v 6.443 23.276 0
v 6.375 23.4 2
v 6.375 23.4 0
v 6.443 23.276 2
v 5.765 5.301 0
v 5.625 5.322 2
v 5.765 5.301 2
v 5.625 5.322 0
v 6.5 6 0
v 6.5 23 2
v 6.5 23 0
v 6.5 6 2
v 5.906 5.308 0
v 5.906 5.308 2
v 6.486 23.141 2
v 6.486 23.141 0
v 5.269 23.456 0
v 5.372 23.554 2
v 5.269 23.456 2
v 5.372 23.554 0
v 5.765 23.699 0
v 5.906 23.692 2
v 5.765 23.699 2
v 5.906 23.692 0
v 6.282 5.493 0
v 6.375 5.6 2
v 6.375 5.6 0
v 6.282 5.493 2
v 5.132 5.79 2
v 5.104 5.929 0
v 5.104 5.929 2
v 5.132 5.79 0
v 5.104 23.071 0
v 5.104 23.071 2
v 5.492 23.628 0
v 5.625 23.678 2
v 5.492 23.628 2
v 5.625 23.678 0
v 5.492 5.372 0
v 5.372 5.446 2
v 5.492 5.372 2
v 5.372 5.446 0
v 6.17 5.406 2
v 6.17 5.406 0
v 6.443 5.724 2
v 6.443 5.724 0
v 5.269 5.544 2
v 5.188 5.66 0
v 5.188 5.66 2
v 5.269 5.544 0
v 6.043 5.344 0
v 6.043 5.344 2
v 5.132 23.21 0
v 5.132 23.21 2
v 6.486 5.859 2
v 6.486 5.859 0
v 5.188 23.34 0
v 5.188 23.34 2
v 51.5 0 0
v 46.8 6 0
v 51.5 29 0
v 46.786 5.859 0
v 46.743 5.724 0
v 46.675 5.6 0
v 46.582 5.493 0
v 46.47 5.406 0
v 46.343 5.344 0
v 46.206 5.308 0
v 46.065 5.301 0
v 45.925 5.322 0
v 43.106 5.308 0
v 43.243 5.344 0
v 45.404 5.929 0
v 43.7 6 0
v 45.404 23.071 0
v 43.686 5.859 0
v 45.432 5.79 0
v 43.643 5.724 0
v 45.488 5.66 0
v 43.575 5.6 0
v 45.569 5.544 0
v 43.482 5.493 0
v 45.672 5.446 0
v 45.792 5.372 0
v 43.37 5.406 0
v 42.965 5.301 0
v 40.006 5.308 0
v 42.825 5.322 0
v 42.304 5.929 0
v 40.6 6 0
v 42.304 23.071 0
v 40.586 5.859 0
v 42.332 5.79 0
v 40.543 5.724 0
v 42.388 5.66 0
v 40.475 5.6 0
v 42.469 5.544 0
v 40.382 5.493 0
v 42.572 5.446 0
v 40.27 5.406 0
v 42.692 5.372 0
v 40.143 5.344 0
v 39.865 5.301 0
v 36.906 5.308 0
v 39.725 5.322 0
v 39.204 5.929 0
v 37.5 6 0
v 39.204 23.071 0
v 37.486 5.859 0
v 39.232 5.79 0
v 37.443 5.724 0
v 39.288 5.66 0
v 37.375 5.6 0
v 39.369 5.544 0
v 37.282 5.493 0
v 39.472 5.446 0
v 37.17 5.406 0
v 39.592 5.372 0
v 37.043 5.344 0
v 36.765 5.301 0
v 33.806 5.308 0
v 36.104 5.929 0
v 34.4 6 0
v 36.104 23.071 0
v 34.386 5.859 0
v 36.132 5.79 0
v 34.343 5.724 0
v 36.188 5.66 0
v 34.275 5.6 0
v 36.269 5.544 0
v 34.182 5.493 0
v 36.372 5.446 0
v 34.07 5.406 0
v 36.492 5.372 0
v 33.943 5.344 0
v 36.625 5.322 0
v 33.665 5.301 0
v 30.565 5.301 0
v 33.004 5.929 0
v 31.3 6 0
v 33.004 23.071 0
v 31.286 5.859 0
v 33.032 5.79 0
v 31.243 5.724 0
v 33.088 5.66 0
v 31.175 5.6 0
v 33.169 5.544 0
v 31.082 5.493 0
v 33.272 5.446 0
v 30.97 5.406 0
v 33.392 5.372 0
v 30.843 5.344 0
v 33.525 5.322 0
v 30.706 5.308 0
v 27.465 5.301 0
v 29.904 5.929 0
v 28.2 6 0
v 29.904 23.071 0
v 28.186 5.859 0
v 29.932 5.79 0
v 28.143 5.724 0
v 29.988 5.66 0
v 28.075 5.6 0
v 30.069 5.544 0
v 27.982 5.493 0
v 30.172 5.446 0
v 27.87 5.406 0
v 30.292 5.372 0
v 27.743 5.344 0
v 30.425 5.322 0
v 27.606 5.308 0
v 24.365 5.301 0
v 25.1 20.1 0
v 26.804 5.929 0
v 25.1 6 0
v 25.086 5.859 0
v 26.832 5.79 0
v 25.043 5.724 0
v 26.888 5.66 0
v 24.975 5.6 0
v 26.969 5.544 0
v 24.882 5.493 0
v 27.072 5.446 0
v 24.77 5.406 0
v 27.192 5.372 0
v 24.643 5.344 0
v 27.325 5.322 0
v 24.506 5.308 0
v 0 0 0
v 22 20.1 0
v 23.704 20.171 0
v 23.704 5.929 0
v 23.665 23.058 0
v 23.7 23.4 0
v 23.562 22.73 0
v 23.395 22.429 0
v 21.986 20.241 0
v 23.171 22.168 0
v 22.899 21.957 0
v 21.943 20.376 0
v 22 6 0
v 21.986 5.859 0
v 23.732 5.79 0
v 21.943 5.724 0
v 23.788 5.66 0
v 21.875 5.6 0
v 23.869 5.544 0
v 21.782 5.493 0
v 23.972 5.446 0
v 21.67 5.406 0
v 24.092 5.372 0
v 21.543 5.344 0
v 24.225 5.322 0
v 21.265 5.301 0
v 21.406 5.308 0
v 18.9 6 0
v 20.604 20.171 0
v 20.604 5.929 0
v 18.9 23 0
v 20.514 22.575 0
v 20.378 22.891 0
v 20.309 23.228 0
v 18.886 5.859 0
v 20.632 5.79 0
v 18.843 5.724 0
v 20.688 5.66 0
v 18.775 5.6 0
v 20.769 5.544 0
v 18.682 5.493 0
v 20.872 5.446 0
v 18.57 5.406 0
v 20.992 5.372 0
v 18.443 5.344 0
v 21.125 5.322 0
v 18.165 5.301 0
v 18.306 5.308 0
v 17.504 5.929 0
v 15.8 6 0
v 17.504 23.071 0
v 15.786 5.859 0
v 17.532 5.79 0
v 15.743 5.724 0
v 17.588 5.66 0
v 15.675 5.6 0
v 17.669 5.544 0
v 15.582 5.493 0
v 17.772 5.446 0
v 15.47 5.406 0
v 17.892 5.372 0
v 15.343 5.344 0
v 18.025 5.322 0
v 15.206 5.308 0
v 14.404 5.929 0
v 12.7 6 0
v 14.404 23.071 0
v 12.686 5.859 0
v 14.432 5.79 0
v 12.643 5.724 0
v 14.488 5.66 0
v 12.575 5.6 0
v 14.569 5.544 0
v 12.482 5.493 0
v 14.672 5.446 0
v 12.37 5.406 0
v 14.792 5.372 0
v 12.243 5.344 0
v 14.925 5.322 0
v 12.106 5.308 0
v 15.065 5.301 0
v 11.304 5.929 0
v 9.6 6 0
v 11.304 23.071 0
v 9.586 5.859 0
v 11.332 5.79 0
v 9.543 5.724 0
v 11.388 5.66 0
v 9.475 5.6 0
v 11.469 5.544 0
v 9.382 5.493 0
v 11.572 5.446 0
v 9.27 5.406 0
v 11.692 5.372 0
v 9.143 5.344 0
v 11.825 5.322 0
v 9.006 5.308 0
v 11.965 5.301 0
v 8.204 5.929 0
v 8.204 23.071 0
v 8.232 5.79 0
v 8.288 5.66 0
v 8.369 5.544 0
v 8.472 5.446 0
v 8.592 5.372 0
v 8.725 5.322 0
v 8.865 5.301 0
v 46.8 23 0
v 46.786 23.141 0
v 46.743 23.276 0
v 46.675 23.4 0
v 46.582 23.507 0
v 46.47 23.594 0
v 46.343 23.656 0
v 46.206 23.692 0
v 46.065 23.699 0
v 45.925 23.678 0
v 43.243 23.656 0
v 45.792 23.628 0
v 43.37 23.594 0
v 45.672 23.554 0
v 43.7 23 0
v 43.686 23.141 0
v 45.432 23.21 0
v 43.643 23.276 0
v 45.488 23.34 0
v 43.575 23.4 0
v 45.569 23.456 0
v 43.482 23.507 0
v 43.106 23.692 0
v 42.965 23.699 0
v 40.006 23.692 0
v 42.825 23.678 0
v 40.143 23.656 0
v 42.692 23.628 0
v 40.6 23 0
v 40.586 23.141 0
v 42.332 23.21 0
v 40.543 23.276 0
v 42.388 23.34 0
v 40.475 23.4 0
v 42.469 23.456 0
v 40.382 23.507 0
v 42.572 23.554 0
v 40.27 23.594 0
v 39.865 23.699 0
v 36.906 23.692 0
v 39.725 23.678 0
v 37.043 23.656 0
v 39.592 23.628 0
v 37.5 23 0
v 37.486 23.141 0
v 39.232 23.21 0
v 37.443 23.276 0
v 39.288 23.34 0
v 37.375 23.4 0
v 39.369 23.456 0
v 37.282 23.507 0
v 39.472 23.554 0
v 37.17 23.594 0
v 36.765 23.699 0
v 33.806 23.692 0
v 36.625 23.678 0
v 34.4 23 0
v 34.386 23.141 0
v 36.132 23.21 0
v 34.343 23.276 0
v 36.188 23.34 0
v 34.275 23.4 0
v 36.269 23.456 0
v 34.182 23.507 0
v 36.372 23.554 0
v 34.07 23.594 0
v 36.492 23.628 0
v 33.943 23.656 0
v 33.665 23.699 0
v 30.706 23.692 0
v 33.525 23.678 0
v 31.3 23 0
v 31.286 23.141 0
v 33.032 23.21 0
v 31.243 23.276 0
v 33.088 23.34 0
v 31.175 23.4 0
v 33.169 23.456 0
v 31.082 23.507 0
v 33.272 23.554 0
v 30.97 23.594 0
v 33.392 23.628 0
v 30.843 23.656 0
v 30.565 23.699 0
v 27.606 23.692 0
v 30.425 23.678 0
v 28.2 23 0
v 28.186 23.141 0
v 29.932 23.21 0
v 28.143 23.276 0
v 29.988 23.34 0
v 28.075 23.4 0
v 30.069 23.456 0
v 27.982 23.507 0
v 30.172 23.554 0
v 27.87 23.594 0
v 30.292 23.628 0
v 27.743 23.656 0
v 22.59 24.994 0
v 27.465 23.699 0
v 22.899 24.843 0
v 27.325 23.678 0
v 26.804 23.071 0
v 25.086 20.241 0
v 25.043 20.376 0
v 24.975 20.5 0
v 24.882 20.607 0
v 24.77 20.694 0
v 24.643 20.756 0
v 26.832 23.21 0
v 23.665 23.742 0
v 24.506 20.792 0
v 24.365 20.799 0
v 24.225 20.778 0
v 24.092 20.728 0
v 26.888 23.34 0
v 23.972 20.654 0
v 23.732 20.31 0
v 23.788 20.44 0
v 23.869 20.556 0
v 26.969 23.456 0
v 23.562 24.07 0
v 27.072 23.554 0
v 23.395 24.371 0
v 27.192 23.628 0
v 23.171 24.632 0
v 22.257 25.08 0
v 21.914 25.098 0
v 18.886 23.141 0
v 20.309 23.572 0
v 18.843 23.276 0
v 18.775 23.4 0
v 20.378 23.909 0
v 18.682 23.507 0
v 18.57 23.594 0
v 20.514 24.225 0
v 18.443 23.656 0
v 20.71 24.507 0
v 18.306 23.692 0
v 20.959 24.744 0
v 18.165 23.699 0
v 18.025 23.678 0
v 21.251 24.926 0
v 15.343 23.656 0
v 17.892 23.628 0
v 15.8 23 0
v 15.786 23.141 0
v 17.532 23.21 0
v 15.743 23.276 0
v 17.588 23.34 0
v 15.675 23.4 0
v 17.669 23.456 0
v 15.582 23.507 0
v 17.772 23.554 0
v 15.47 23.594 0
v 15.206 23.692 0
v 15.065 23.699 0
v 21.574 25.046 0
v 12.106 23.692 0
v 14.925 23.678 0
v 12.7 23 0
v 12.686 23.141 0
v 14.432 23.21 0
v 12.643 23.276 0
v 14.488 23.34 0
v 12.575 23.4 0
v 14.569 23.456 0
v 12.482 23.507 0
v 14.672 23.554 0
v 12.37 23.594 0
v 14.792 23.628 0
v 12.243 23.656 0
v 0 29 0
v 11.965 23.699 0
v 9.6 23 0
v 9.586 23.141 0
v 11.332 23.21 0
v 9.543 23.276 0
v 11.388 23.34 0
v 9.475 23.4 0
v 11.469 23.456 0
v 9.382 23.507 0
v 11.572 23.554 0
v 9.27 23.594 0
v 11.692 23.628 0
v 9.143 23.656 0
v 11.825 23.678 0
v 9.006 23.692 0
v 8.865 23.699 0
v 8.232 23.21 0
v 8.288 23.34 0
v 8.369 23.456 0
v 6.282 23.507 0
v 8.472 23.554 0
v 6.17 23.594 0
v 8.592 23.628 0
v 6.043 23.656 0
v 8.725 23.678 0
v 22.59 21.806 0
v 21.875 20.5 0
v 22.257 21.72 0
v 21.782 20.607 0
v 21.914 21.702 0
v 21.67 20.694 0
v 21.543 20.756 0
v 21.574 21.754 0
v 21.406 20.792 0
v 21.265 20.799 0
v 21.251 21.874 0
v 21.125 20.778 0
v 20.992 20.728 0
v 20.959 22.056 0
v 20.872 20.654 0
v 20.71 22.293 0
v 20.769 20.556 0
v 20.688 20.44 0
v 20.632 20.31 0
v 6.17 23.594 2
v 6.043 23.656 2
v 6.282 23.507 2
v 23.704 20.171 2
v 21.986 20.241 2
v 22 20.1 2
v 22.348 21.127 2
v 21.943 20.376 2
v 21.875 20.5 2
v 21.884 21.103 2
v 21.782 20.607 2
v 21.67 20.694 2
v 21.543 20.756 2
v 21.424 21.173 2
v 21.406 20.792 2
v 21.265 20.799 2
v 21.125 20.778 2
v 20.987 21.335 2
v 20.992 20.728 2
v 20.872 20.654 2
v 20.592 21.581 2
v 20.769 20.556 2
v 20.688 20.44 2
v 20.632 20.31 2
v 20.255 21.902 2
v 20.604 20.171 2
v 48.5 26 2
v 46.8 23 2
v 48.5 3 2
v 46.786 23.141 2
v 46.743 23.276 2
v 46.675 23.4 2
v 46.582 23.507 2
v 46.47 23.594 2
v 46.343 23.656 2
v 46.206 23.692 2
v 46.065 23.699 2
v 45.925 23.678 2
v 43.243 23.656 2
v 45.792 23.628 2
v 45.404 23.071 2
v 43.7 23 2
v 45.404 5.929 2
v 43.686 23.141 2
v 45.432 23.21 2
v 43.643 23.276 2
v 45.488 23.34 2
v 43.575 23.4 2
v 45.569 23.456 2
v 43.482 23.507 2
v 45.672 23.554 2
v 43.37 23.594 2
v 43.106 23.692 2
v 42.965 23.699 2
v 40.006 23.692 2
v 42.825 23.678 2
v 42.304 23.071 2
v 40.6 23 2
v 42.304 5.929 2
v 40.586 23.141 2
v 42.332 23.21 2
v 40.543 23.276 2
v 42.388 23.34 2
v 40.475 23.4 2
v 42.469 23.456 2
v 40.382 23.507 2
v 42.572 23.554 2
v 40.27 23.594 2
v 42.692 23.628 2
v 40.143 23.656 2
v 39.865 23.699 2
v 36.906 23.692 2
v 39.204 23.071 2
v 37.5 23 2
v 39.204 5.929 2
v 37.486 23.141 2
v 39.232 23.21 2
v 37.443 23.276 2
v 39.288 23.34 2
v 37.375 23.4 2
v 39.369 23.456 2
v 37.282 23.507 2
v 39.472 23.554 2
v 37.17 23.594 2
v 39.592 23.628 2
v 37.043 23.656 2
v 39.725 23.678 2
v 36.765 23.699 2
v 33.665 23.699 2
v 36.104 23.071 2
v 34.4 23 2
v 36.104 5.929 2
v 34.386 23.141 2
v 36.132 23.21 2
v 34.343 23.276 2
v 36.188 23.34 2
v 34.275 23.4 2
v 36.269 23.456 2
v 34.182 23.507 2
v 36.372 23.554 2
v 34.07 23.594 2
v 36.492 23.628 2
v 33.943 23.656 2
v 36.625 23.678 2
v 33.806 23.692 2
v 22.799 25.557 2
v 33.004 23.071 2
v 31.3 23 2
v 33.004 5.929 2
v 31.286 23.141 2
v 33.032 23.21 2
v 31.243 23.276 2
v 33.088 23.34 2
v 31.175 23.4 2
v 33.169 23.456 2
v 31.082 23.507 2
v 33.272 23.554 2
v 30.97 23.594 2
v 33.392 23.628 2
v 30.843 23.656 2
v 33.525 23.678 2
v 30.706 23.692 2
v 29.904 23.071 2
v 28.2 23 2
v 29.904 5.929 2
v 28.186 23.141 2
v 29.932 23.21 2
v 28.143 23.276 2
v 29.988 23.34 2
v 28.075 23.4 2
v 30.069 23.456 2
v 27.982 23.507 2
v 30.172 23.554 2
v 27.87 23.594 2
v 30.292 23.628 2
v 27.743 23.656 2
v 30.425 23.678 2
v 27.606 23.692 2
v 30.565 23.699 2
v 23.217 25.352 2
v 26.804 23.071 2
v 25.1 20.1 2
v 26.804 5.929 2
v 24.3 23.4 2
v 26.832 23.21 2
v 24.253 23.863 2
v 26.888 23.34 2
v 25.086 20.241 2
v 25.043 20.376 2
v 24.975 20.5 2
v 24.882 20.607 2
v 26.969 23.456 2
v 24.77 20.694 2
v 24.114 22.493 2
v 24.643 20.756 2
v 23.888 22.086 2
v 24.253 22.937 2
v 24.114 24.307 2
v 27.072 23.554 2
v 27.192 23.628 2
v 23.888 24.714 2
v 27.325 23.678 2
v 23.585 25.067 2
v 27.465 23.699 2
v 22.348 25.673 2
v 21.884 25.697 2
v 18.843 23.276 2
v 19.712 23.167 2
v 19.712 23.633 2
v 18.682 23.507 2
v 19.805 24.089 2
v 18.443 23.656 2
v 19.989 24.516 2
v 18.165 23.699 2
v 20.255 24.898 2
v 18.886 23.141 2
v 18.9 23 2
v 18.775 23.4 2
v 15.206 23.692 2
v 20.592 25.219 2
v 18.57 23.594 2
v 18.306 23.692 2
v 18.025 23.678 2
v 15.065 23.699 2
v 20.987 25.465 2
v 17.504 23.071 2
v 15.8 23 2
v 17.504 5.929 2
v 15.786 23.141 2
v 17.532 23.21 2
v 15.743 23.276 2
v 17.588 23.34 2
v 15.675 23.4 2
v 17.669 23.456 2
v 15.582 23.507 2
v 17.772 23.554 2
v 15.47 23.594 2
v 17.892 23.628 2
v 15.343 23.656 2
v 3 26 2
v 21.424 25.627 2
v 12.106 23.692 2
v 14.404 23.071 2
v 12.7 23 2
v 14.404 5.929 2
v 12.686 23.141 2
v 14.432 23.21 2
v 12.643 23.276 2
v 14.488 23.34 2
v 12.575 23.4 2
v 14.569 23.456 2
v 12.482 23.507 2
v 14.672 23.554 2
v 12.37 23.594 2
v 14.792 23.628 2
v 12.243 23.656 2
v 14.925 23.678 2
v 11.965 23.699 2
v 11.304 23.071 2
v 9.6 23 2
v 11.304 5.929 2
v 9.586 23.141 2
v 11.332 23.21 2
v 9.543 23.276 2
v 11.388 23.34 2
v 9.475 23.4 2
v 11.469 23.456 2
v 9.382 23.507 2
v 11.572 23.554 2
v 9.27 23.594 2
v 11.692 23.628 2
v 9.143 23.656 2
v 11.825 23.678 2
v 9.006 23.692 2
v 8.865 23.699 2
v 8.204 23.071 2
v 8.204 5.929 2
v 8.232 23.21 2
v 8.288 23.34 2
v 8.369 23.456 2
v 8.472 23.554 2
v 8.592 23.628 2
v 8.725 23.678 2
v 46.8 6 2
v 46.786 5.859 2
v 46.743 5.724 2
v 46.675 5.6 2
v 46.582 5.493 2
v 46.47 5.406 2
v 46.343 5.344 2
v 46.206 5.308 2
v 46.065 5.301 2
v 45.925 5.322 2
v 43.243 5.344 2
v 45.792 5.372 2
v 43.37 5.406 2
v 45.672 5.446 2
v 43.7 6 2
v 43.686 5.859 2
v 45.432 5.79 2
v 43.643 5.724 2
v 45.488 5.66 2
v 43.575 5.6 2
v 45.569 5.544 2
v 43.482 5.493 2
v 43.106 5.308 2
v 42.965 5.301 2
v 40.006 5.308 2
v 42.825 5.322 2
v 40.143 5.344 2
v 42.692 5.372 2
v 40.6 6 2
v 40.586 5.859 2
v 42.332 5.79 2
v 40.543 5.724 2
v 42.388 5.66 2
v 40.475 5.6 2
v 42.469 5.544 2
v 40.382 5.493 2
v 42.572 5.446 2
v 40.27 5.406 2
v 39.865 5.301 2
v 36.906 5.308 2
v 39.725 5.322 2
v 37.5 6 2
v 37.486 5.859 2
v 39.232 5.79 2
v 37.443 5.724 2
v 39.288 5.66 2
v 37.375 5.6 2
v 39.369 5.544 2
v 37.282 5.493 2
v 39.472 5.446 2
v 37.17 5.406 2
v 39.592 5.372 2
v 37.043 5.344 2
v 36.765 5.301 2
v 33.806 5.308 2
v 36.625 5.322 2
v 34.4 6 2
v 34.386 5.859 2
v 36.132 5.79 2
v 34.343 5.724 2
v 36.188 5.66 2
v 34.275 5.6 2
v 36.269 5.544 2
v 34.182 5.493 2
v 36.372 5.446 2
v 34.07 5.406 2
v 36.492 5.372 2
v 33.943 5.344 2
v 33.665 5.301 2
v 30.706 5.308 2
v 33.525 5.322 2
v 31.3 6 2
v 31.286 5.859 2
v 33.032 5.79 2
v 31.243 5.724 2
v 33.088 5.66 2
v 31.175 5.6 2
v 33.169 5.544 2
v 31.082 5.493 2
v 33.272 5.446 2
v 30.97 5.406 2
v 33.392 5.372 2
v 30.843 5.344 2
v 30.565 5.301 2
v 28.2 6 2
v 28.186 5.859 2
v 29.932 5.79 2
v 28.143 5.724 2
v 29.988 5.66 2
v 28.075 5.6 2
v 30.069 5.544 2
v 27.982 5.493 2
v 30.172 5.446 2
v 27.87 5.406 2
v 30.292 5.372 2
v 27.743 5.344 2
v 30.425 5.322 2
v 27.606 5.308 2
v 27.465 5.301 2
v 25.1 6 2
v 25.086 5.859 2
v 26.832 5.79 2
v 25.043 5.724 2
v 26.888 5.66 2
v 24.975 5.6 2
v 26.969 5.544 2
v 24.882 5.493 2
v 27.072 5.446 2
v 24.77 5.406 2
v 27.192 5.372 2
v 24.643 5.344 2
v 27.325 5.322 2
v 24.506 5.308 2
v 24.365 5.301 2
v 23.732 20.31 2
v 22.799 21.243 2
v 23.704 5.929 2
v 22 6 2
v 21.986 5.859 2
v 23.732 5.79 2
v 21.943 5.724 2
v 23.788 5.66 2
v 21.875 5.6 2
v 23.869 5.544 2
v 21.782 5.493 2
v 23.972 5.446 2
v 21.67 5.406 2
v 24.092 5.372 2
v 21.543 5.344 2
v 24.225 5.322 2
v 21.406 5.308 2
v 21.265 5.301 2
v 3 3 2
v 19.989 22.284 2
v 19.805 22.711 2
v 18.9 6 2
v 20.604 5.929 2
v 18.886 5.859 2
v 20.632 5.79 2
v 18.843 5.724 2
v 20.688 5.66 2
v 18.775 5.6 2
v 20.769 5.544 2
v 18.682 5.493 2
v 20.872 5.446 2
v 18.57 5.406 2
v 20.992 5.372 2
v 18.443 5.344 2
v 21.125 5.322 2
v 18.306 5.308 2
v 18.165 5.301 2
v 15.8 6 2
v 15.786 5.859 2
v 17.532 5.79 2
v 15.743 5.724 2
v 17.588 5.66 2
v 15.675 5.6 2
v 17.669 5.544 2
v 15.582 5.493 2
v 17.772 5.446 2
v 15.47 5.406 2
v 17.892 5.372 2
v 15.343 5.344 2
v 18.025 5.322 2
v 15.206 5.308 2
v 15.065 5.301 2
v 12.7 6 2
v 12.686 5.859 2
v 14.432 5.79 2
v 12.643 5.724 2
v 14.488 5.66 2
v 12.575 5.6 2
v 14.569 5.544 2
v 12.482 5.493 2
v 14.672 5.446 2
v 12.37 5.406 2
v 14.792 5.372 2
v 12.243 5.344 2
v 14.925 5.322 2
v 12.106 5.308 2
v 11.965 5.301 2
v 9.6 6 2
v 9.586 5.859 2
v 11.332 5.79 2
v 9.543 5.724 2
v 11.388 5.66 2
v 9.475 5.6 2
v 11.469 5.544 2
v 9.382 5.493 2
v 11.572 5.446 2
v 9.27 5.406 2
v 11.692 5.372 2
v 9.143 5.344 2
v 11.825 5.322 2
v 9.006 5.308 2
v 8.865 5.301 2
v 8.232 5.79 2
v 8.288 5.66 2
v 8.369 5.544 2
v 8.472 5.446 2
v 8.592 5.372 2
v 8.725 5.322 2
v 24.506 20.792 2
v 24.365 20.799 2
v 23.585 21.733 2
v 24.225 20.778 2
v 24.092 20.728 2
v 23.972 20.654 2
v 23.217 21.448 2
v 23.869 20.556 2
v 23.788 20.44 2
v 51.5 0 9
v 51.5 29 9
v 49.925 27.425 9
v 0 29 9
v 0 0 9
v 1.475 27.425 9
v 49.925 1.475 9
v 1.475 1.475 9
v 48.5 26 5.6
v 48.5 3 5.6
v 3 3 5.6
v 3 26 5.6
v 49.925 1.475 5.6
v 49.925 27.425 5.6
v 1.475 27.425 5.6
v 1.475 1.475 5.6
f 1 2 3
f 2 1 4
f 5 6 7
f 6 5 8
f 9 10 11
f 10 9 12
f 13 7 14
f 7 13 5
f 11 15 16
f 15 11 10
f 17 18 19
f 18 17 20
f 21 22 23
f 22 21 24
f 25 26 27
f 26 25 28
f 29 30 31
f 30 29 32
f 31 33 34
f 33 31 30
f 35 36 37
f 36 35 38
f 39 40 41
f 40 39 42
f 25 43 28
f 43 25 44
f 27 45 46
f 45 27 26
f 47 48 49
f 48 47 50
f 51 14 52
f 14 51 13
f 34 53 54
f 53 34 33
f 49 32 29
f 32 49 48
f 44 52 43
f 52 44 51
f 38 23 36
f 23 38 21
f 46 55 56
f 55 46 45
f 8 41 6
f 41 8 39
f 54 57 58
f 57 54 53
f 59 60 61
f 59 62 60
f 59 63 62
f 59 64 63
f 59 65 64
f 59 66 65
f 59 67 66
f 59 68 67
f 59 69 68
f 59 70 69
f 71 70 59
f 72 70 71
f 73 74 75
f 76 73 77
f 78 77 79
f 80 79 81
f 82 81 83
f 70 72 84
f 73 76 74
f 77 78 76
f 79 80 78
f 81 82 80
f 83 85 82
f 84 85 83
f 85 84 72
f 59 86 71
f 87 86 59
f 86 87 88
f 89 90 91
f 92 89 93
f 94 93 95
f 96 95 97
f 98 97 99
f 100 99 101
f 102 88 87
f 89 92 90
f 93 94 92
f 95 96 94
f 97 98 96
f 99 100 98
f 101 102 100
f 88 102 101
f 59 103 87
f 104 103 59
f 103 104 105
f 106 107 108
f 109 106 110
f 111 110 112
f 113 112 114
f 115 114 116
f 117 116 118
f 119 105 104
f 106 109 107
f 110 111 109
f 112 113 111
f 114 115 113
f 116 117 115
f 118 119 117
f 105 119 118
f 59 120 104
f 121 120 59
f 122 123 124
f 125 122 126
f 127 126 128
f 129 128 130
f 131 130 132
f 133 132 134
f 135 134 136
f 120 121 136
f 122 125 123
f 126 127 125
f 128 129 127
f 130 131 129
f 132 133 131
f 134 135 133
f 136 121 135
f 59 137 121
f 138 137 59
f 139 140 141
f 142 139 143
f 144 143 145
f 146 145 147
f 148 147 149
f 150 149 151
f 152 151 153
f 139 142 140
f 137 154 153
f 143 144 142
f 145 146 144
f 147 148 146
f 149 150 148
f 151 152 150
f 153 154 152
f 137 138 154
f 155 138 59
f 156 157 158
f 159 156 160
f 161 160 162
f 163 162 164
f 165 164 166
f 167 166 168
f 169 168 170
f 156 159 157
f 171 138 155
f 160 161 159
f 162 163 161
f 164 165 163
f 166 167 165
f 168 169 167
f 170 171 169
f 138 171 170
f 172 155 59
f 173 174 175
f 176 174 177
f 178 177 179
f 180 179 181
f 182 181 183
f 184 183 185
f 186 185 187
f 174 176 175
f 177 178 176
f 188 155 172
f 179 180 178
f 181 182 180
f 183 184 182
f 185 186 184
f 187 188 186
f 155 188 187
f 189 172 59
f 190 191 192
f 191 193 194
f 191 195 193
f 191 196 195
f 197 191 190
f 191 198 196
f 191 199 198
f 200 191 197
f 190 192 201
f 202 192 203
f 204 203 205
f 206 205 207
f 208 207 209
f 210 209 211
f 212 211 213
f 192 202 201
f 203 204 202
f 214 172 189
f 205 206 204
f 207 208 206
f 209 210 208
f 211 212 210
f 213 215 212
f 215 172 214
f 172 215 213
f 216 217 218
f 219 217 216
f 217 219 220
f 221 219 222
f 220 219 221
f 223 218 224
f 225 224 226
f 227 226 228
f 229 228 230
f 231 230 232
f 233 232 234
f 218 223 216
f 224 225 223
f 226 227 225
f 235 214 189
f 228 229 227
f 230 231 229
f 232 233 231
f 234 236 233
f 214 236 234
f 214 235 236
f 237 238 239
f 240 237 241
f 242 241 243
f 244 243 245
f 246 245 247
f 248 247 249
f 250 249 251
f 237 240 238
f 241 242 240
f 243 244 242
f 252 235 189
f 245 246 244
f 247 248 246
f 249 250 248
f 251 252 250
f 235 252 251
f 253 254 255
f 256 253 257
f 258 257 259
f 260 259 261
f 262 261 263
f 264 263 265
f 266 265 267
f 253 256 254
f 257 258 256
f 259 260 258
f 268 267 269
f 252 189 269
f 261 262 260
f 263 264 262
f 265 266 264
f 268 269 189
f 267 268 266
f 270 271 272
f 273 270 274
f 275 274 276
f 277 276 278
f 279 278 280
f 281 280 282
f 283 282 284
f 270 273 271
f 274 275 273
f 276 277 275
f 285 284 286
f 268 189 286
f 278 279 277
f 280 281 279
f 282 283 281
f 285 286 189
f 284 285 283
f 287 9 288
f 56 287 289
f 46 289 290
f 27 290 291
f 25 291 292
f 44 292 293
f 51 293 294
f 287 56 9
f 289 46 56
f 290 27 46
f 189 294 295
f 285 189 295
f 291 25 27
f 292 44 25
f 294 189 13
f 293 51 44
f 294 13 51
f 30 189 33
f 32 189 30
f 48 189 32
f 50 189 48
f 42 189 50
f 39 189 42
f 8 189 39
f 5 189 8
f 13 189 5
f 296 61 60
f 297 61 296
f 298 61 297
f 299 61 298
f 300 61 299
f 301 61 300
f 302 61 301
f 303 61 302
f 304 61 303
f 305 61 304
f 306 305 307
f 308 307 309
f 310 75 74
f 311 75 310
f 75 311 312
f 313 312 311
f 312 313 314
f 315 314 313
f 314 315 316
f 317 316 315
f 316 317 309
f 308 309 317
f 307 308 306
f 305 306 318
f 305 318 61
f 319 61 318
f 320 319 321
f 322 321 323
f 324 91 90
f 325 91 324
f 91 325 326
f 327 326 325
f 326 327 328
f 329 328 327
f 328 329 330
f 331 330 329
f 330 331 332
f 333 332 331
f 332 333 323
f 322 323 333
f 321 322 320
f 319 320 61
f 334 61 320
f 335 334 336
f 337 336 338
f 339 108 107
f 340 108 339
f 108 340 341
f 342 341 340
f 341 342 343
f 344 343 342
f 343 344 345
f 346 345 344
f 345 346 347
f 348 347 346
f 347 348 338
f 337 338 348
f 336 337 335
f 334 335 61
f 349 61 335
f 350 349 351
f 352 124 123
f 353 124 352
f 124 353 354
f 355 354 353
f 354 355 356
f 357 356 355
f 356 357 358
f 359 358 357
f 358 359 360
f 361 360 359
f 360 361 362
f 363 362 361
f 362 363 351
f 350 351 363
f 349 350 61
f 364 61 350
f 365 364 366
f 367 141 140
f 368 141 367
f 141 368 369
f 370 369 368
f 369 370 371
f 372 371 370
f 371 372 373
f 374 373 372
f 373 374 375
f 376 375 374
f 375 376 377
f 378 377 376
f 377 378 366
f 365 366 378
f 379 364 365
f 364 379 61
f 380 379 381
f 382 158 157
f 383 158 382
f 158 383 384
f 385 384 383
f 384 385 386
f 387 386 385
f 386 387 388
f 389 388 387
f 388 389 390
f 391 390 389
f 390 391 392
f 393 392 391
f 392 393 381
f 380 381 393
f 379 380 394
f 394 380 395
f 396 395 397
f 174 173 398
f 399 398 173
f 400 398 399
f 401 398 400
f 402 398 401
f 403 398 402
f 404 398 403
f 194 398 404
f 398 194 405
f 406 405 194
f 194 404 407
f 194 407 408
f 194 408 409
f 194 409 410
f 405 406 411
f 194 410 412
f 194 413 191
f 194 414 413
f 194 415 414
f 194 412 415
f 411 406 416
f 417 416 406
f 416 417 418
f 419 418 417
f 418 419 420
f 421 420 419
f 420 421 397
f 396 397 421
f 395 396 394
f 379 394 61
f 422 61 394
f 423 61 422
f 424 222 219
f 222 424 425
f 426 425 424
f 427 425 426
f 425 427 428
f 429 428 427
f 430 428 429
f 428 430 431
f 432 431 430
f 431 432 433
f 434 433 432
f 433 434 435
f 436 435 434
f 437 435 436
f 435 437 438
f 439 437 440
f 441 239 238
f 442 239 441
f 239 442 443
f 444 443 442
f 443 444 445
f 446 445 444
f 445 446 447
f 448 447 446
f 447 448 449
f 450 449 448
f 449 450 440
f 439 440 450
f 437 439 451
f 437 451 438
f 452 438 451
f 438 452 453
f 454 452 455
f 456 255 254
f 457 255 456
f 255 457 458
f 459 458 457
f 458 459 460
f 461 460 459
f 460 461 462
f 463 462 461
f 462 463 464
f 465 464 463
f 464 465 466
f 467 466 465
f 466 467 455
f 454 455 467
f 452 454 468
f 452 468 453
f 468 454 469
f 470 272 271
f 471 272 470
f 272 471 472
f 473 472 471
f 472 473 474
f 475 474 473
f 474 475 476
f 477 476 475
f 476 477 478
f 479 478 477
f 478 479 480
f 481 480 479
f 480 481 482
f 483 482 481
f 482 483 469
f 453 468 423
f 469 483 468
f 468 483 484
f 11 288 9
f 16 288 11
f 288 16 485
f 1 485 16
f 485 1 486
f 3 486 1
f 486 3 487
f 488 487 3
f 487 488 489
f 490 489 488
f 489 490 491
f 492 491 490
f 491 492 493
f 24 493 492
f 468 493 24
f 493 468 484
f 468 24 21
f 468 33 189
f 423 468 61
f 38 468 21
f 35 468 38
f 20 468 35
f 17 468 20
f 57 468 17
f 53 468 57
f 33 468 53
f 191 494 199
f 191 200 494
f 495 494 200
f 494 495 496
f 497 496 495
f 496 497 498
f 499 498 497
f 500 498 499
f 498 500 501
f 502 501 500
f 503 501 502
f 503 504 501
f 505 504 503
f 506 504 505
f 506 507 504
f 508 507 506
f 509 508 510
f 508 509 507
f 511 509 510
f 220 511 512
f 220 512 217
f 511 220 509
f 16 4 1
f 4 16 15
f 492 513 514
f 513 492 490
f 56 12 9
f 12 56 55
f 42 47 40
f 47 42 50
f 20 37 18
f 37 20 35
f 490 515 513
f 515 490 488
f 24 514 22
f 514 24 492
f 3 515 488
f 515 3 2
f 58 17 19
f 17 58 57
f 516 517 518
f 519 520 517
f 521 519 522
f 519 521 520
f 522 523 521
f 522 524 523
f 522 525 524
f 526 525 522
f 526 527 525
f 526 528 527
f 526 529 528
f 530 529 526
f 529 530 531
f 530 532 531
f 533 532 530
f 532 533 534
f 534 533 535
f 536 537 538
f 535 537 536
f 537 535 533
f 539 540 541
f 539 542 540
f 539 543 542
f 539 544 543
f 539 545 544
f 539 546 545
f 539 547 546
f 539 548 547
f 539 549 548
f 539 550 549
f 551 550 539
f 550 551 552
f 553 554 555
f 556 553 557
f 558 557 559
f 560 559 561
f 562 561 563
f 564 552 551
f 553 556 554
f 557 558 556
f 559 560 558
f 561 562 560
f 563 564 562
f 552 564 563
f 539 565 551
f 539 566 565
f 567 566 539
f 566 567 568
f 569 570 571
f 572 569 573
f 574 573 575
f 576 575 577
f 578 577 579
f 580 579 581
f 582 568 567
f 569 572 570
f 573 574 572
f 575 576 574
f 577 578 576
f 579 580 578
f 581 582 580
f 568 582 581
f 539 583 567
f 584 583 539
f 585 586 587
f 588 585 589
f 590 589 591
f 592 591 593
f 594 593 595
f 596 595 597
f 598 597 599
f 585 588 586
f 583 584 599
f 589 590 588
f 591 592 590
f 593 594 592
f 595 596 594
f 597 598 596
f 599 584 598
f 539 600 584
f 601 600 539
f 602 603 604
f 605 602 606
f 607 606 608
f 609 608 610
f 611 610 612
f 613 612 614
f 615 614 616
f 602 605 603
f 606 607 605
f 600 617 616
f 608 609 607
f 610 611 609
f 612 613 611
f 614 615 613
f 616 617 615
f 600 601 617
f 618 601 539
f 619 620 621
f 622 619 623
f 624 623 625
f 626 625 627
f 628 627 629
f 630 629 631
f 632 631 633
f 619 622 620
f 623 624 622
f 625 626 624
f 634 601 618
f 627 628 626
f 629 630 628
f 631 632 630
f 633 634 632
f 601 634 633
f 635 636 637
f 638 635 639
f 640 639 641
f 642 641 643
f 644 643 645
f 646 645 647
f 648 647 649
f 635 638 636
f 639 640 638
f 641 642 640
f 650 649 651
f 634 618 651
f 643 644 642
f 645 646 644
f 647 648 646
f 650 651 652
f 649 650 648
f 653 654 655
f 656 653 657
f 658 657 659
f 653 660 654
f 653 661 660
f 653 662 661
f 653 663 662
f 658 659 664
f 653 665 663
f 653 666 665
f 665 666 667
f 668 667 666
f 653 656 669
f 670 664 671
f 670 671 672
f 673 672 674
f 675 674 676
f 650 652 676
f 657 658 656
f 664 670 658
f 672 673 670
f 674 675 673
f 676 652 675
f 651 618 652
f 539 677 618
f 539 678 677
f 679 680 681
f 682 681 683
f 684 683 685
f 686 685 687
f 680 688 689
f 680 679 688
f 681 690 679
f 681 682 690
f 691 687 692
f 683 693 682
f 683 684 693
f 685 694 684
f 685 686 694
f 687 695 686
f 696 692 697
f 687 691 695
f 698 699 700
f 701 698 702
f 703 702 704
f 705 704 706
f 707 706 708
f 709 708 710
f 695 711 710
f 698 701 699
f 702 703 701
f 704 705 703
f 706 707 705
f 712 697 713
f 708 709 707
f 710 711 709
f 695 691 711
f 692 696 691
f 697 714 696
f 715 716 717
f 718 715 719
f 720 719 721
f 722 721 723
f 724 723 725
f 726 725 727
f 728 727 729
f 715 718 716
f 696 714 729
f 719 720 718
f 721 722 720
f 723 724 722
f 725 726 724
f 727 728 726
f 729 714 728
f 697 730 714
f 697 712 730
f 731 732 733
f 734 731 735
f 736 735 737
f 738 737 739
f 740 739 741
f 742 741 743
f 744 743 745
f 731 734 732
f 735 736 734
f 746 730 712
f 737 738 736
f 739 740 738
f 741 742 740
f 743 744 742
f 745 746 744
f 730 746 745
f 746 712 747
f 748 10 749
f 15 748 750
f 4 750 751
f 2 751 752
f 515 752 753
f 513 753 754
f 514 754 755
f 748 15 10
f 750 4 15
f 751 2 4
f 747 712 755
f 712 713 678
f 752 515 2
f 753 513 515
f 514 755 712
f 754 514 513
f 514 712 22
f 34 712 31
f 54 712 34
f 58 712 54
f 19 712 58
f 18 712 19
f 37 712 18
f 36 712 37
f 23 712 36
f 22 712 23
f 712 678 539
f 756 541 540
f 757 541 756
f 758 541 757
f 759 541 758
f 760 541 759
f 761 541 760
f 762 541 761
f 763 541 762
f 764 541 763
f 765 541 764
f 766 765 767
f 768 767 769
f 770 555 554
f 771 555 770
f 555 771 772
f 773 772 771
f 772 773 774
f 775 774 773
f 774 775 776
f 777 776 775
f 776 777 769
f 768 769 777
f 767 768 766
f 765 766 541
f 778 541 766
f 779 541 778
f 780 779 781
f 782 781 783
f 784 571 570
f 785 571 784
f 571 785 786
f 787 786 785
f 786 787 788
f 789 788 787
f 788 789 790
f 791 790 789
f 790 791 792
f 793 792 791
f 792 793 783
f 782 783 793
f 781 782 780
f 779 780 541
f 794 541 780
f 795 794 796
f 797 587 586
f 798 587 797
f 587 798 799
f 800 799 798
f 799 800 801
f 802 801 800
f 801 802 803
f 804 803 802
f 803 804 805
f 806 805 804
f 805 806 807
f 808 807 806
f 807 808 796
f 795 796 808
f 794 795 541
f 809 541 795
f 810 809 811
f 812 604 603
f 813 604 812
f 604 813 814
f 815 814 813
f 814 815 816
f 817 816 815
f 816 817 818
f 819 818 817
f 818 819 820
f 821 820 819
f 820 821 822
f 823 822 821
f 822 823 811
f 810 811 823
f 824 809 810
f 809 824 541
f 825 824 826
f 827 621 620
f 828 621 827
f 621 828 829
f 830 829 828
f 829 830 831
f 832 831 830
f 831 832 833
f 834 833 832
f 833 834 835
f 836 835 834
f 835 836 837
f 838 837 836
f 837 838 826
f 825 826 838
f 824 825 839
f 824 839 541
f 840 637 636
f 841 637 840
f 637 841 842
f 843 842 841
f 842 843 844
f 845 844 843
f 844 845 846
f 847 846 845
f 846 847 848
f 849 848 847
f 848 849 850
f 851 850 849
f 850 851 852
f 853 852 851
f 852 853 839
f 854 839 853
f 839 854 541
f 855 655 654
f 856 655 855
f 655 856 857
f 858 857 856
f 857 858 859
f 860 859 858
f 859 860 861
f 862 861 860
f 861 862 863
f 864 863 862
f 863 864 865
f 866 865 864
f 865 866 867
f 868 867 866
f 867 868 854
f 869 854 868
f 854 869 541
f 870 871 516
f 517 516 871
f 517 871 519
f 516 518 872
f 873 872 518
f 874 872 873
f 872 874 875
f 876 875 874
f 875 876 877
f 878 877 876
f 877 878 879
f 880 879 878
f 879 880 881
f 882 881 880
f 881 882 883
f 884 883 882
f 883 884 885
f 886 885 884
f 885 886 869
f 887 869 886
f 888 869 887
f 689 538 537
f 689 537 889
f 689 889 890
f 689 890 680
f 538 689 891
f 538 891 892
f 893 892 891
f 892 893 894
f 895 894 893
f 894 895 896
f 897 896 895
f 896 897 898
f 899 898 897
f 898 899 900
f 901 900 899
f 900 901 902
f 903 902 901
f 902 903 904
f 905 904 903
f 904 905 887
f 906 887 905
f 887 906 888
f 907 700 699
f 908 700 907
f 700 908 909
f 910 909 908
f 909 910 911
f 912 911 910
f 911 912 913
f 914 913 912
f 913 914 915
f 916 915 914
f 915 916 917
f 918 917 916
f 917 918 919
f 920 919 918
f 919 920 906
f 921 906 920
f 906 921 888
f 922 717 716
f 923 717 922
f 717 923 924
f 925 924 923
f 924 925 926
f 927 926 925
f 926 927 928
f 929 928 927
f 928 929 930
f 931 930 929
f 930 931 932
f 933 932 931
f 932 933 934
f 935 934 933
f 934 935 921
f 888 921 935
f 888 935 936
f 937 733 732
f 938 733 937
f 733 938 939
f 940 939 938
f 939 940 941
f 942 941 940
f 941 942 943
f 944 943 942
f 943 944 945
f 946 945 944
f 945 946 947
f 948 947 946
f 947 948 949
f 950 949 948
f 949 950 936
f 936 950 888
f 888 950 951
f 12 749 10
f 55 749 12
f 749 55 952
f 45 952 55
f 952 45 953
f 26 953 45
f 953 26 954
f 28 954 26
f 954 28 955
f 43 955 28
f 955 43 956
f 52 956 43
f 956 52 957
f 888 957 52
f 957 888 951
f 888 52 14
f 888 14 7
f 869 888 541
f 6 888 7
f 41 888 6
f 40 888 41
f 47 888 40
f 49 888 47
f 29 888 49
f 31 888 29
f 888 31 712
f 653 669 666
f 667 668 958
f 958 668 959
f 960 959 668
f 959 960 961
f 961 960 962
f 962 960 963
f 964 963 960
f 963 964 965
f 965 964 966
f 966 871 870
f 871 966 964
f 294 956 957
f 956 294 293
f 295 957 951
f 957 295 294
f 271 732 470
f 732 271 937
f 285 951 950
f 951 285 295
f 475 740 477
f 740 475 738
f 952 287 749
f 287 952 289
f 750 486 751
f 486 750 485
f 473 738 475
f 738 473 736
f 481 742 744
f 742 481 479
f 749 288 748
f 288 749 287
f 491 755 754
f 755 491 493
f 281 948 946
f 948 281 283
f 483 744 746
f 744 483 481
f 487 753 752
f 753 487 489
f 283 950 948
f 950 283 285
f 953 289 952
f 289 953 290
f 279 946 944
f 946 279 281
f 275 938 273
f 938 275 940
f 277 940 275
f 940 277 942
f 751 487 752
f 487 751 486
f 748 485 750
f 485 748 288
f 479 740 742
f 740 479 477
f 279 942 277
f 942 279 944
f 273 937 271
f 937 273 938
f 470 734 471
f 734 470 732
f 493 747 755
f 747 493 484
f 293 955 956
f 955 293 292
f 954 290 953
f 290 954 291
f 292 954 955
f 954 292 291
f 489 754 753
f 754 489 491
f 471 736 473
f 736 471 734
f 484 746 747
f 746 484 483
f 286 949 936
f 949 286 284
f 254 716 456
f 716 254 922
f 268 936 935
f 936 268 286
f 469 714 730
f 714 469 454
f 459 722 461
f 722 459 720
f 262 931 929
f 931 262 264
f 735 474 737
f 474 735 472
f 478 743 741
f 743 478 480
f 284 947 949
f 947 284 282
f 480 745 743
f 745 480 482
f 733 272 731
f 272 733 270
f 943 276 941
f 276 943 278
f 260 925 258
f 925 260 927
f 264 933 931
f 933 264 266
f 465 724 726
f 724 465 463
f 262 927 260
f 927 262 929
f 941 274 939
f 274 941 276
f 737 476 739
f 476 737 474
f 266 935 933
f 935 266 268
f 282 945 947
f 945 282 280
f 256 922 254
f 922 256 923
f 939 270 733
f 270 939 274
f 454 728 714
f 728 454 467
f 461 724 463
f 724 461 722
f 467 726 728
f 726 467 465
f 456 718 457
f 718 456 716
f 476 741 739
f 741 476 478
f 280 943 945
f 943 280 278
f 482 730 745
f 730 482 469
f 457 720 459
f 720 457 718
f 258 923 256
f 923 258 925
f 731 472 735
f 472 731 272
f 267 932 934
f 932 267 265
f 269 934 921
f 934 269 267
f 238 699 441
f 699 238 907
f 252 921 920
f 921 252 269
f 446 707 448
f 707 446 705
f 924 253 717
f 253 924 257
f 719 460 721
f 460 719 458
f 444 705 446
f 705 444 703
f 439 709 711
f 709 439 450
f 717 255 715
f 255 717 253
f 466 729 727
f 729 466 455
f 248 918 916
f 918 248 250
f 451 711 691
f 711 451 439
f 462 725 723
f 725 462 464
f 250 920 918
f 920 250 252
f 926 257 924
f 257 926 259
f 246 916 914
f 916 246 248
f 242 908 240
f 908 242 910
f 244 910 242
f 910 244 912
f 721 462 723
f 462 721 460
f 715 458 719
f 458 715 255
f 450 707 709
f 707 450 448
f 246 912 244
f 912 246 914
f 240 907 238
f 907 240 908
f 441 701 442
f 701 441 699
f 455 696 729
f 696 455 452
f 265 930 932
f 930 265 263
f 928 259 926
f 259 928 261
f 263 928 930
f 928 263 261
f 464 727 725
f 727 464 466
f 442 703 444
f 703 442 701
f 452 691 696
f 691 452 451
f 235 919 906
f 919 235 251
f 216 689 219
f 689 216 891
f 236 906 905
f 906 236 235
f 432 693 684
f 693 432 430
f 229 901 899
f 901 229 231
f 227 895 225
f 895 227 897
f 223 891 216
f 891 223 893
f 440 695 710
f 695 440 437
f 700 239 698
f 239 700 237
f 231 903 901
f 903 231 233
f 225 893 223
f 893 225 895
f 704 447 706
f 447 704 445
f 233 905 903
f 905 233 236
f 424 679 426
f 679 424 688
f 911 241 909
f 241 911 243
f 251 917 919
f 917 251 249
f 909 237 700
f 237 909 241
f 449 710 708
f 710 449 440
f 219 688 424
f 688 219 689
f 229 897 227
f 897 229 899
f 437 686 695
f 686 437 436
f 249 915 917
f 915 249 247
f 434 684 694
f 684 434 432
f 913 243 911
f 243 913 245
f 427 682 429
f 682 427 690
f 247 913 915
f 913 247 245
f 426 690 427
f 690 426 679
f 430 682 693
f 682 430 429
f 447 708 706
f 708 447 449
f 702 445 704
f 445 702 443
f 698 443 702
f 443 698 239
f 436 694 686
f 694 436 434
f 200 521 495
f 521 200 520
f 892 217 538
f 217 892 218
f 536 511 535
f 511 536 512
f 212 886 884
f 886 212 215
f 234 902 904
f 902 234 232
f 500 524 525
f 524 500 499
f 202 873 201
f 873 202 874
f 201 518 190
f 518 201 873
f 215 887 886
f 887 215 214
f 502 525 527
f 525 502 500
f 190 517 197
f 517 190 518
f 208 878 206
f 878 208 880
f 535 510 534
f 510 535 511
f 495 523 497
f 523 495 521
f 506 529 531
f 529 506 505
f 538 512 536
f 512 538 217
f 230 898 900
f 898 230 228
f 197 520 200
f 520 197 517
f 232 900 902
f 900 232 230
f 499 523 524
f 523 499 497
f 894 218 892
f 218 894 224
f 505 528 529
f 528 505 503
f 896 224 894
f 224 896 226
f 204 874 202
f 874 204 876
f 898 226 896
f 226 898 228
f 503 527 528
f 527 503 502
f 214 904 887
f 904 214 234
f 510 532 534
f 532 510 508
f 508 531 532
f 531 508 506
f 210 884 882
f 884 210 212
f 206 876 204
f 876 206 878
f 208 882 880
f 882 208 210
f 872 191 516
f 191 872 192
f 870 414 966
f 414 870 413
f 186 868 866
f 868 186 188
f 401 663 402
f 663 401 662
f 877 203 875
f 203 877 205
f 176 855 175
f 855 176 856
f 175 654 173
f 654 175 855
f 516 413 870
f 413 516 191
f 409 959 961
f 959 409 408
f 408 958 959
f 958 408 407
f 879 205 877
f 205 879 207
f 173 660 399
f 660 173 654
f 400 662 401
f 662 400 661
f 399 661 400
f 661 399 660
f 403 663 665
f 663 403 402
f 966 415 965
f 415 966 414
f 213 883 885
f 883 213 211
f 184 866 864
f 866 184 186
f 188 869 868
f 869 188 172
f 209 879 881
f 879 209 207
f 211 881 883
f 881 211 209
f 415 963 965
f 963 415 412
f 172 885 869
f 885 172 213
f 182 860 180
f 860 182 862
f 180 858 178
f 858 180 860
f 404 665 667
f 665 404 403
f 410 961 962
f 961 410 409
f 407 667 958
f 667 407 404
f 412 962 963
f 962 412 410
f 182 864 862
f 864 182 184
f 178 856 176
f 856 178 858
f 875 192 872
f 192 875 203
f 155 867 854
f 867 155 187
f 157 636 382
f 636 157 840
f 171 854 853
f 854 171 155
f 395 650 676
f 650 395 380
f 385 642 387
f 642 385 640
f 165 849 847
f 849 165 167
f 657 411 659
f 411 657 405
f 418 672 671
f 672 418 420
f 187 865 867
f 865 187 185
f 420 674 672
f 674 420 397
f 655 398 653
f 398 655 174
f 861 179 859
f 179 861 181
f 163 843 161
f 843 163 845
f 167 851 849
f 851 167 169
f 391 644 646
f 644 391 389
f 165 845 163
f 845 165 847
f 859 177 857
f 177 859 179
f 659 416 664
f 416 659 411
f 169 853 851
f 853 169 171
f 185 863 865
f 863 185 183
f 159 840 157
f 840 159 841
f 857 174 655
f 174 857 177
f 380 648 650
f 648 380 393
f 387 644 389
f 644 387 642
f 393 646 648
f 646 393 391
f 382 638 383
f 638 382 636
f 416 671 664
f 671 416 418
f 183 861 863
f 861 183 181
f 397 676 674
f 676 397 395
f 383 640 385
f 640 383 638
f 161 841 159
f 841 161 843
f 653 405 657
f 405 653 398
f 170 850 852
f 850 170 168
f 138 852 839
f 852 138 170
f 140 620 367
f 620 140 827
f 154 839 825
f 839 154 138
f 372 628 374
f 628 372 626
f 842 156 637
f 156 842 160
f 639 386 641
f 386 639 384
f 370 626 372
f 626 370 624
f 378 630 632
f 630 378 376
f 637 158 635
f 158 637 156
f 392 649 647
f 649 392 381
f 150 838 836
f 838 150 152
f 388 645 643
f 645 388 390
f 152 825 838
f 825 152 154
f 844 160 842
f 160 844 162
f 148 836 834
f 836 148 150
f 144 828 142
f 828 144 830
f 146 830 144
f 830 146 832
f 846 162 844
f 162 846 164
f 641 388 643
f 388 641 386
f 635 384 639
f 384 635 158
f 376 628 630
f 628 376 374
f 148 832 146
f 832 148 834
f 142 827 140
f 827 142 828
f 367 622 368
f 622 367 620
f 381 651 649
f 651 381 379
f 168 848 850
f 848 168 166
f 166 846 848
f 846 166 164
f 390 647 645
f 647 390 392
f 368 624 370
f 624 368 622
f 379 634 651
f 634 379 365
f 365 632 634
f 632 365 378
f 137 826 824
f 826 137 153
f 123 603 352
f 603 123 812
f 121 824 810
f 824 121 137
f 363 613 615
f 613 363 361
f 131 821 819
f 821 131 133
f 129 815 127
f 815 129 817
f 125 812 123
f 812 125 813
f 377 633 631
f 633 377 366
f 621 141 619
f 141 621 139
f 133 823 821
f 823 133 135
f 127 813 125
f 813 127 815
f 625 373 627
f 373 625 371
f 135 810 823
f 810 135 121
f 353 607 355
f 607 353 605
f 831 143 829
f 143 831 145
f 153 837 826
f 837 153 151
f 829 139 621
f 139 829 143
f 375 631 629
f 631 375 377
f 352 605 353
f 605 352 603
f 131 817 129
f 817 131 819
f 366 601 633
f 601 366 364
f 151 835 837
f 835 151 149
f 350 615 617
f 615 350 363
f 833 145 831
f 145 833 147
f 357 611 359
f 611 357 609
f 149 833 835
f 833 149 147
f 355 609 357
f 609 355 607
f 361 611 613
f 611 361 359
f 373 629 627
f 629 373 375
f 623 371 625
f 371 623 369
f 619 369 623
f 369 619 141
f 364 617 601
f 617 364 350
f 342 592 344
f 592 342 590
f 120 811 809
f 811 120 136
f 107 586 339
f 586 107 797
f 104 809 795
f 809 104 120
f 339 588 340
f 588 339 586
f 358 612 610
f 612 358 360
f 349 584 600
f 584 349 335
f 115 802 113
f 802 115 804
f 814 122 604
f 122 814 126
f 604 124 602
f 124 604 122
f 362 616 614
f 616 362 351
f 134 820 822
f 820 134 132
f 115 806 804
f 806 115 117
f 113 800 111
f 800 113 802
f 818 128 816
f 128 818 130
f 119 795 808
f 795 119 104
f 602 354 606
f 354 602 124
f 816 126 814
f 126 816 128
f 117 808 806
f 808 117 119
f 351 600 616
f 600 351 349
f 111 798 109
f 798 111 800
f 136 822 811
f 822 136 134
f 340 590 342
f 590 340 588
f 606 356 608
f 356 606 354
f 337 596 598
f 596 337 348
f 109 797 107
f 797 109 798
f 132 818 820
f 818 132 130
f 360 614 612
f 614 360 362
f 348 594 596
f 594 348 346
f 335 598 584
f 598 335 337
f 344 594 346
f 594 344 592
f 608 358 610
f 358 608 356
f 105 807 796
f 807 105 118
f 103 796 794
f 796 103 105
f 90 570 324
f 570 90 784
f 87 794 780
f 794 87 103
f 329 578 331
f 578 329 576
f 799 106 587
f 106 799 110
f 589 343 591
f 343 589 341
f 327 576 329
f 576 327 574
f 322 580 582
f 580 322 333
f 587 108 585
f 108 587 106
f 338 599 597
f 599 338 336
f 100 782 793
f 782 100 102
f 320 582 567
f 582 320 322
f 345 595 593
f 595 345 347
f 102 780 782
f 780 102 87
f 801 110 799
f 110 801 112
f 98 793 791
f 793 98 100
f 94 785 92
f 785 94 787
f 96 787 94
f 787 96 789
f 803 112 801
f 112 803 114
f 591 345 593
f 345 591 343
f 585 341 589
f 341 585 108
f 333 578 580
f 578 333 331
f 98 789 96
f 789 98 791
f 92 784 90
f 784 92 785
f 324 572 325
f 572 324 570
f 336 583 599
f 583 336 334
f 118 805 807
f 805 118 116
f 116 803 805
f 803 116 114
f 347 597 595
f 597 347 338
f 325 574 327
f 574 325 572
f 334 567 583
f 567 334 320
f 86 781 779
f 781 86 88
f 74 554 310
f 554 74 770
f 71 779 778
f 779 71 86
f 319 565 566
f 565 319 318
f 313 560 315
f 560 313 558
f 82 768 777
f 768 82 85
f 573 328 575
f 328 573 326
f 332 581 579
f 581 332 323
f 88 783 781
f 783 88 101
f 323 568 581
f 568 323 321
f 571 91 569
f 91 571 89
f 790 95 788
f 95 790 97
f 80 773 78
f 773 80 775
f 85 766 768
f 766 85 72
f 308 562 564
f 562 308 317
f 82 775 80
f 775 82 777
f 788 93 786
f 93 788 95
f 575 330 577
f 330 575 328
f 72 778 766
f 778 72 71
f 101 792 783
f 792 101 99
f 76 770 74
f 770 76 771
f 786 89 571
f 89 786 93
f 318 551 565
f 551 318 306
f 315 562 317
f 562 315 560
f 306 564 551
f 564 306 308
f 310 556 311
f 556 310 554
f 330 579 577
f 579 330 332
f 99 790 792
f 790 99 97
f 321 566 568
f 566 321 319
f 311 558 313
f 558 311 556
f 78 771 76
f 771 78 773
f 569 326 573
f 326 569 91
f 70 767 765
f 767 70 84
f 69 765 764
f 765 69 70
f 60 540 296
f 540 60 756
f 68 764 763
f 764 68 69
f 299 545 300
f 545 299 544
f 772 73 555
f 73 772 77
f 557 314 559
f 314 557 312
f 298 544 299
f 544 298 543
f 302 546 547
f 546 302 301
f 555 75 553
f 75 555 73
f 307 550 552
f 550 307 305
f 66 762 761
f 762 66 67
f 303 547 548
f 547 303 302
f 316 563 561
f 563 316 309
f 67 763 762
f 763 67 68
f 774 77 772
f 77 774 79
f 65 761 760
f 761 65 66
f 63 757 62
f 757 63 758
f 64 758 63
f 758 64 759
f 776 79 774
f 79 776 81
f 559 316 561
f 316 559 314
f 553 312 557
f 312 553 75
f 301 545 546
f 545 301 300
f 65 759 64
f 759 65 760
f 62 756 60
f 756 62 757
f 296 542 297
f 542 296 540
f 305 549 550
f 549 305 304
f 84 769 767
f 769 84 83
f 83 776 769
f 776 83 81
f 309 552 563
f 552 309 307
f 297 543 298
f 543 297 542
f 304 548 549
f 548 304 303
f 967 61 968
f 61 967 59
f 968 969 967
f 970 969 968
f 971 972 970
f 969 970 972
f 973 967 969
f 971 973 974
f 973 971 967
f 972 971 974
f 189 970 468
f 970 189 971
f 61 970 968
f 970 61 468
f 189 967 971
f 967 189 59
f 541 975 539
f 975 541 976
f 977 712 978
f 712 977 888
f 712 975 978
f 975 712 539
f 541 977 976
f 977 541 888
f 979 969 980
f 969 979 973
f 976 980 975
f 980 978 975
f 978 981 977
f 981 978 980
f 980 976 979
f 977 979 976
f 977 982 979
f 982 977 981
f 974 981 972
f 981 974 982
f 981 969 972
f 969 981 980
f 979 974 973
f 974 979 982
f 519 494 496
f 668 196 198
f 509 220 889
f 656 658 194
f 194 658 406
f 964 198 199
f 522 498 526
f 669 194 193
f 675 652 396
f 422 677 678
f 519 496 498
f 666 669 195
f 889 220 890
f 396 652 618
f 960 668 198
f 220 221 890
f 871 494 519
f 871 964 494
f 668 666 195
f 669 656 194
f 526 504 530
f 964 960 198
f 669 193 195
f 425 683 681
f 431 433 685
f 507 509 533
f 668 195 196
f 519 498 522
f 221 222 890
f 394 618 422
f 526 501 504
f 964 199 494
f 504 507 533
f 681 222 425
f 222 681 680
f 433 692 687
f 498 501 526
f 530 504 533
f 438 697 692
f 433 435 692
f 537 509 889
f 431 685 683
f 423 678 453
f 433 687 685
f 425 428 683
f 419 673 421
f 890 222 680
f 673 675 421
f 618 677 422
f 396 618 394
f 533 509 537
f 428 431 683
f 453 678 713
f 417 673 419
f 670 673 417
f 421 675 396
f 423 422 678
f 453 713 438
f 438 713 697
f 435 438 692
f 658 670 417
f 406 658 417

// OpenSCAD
/*
 * Friction-fit Chassis for LM2596-based buck converter
 *
 * Designed and written by Roy Sigurd Karlsbakk <roy@karlsbakk.net> 2024
 * Licensed under CC BY NC 4.0 https://creativecommons.org/licenses/by/4.0/
 */

debug = true;
idiot = $preview ? .5 : 0;
fn = $preview ? 12 : 31;

board_x = 43.5;
board_y = 21;
ol_height = 3; // overlapp
b_height = 9;
t_height = 16-b_height; // bare skruen stikker ut
walls = 3;
gap = 1;
bottom = 3;
top = 2;
hole_r = 1.5;
lh_width = 4; // lead hole
lh_height = 5.5; // lead hole
tolerance_x = .05;
tolerance_z = .4;
pot_x = 9.5;
pot_y = 5.1;
pot_z = 1.5;
b_wedge = 1.15;
t_wedge = .01;
w_wedge = 2;

module bottom() {
    difference() {
        cube([board_x+walls*2+gap*2,board_y+walls*2+gap*2,b_height+bottom]);
        translate([walls,walls,bottom]) {
            cube([board_x+gap*2,board_y+gap*2,b_height+idiot]);
        }
        translate([0,0,bottom+b_height-ol_height]) {
            difference() {
                cube([board_x+walls*2+gap*2,board_y+walls*2+gap*2,ol_height]);
                translate([walls/2,walls/2,0]) {
                    cube([board_x+walls+gap*2,board_y+walls+gap*2,ol_height]);
                }
            }
        }
        translate([0,walls+gap,bottom-1]) {
            cube([walls+5,lh_width,lh_height+1]);
        }
        translate([0,walls+board_y-lh_width+gap,bottom-1]) {
            cube([walls+5,lh_width,lh_height+1]);
        }
        translate([walls+board_x+gap*2-5,walls+gap,bottom-1]) {
            cube([walls+5,lh_width,lh_height+1]);
        }
        translate([walls+board_x+gap*2-5,walls+board_y-lh_width+gap,bottom-1]) {
            cube([walls+5,lh_width,lh_height+1]);
        }
        translate([walls+gap+23.8,walls+board_y+gap-pot_y,bottom-pot_z]) {
            cube([pot_x,pot_y,pot_z]);
        }
    }
    translate([walls+board_x*.15,walls,bottom]) {
        hull() {
            cube([w_wedge,b_wedge,t_wedge]);
            translate([0,0,b_height]) {
                cube([w_wedge,t_wedge,t_wedge]);
            }
        }
    }
    translate([walls+board_x*.85-1,walls,bottom]) {
        hull() {
            cube([w_wedge,b_wedge,t_wedge]);
            translate([0,0,b_height]) {
                cube([w_wedge,t_wedge,t_wedge]);
            }
        }
    }
    translate([walls+board_x*.15,board_y+walls+gap*2-b_wedge,bottom]) {
        hull() {
            cube([w_wedge,b_wedge,t_wedge]);
            translate([0,b_wedge,b_height]) {
                cube([w_wedge,t_wedge,t_wedge]);
            }
        }
    }
    translate([walls+board_x*.85-1,board_y+walls+gap*2-b_wedge,bottom]) {
        hull() {
            cube([w_wedge,b_wedge,t_wedge]);
            translate([0,b_wedge,b_height]) {
                cube([w_wedge,t_wedge,t_wedge]);
            }
        }
    }
    translate([walls,board_y/2+walls-w_wedge/2,bottom]) {
        hull() {
            cube([b_wedge,w_wedge,t_wedge]);
            translate([0,b_wedge,b_height]) {
                cube([t_wedge,w_wedge,t_wedge]);
            }
        }
    }
    translate([walls+board_x+gap*2-b_wedge,board_y/2+walls-w_wedge/2,bottom]) {
        hull() {
            cube([b_wedge,w_wedge,t_wedge]);
            translate([b_wedge,0,b_height]) {
                cube([t_wedge,w_wedge,t_wedge]);
            }
        }
    }
}

module top() {
    difference() {
        cube([board_x+walls*2+gap*2,board_y+walls*2+gap*2,t_height+top]);
        translate([walls,walls,top]) {
            cube([board_x+gap*2,board_y+gap*2,t_height+idiot]);
        }
        translate([walls/2-tolerance_x/2,walls/2-tolerance_x/2,top+t_height-ol_height-tolerance_z]) {
            cube([board_x+walls+gap*2-tolerance_x,board_y+walls+gap*2-tolerance_x,ol_height+tolerance_z]);
        }
        translate([walls+gap+18,walls+board_y+gap-(pot_y-3.5),0]) {
            cylinder(d1=3.4, d2=4.6, h=top+idiot, $fn=fn);
        }
        for (x=[walls*2-.2:3.1:board_x+walls]) {
            translate([x,walls*2,0]) {
                hull() {
                    corr = (x > 20 && x < 26) ? pot_y-8 : 0;
                    cylinder(h=top, r=.7, $fn=fn);
                    translate([0,17+corr,0]) {
                        cylinder(h=top, r=.7, $fn=fn);
                    }
                }
            }
        }
    }
}

/* Draw them */
//bottom();
top();
/*
translate([0,-32,0]) {
    top();
}
*/
